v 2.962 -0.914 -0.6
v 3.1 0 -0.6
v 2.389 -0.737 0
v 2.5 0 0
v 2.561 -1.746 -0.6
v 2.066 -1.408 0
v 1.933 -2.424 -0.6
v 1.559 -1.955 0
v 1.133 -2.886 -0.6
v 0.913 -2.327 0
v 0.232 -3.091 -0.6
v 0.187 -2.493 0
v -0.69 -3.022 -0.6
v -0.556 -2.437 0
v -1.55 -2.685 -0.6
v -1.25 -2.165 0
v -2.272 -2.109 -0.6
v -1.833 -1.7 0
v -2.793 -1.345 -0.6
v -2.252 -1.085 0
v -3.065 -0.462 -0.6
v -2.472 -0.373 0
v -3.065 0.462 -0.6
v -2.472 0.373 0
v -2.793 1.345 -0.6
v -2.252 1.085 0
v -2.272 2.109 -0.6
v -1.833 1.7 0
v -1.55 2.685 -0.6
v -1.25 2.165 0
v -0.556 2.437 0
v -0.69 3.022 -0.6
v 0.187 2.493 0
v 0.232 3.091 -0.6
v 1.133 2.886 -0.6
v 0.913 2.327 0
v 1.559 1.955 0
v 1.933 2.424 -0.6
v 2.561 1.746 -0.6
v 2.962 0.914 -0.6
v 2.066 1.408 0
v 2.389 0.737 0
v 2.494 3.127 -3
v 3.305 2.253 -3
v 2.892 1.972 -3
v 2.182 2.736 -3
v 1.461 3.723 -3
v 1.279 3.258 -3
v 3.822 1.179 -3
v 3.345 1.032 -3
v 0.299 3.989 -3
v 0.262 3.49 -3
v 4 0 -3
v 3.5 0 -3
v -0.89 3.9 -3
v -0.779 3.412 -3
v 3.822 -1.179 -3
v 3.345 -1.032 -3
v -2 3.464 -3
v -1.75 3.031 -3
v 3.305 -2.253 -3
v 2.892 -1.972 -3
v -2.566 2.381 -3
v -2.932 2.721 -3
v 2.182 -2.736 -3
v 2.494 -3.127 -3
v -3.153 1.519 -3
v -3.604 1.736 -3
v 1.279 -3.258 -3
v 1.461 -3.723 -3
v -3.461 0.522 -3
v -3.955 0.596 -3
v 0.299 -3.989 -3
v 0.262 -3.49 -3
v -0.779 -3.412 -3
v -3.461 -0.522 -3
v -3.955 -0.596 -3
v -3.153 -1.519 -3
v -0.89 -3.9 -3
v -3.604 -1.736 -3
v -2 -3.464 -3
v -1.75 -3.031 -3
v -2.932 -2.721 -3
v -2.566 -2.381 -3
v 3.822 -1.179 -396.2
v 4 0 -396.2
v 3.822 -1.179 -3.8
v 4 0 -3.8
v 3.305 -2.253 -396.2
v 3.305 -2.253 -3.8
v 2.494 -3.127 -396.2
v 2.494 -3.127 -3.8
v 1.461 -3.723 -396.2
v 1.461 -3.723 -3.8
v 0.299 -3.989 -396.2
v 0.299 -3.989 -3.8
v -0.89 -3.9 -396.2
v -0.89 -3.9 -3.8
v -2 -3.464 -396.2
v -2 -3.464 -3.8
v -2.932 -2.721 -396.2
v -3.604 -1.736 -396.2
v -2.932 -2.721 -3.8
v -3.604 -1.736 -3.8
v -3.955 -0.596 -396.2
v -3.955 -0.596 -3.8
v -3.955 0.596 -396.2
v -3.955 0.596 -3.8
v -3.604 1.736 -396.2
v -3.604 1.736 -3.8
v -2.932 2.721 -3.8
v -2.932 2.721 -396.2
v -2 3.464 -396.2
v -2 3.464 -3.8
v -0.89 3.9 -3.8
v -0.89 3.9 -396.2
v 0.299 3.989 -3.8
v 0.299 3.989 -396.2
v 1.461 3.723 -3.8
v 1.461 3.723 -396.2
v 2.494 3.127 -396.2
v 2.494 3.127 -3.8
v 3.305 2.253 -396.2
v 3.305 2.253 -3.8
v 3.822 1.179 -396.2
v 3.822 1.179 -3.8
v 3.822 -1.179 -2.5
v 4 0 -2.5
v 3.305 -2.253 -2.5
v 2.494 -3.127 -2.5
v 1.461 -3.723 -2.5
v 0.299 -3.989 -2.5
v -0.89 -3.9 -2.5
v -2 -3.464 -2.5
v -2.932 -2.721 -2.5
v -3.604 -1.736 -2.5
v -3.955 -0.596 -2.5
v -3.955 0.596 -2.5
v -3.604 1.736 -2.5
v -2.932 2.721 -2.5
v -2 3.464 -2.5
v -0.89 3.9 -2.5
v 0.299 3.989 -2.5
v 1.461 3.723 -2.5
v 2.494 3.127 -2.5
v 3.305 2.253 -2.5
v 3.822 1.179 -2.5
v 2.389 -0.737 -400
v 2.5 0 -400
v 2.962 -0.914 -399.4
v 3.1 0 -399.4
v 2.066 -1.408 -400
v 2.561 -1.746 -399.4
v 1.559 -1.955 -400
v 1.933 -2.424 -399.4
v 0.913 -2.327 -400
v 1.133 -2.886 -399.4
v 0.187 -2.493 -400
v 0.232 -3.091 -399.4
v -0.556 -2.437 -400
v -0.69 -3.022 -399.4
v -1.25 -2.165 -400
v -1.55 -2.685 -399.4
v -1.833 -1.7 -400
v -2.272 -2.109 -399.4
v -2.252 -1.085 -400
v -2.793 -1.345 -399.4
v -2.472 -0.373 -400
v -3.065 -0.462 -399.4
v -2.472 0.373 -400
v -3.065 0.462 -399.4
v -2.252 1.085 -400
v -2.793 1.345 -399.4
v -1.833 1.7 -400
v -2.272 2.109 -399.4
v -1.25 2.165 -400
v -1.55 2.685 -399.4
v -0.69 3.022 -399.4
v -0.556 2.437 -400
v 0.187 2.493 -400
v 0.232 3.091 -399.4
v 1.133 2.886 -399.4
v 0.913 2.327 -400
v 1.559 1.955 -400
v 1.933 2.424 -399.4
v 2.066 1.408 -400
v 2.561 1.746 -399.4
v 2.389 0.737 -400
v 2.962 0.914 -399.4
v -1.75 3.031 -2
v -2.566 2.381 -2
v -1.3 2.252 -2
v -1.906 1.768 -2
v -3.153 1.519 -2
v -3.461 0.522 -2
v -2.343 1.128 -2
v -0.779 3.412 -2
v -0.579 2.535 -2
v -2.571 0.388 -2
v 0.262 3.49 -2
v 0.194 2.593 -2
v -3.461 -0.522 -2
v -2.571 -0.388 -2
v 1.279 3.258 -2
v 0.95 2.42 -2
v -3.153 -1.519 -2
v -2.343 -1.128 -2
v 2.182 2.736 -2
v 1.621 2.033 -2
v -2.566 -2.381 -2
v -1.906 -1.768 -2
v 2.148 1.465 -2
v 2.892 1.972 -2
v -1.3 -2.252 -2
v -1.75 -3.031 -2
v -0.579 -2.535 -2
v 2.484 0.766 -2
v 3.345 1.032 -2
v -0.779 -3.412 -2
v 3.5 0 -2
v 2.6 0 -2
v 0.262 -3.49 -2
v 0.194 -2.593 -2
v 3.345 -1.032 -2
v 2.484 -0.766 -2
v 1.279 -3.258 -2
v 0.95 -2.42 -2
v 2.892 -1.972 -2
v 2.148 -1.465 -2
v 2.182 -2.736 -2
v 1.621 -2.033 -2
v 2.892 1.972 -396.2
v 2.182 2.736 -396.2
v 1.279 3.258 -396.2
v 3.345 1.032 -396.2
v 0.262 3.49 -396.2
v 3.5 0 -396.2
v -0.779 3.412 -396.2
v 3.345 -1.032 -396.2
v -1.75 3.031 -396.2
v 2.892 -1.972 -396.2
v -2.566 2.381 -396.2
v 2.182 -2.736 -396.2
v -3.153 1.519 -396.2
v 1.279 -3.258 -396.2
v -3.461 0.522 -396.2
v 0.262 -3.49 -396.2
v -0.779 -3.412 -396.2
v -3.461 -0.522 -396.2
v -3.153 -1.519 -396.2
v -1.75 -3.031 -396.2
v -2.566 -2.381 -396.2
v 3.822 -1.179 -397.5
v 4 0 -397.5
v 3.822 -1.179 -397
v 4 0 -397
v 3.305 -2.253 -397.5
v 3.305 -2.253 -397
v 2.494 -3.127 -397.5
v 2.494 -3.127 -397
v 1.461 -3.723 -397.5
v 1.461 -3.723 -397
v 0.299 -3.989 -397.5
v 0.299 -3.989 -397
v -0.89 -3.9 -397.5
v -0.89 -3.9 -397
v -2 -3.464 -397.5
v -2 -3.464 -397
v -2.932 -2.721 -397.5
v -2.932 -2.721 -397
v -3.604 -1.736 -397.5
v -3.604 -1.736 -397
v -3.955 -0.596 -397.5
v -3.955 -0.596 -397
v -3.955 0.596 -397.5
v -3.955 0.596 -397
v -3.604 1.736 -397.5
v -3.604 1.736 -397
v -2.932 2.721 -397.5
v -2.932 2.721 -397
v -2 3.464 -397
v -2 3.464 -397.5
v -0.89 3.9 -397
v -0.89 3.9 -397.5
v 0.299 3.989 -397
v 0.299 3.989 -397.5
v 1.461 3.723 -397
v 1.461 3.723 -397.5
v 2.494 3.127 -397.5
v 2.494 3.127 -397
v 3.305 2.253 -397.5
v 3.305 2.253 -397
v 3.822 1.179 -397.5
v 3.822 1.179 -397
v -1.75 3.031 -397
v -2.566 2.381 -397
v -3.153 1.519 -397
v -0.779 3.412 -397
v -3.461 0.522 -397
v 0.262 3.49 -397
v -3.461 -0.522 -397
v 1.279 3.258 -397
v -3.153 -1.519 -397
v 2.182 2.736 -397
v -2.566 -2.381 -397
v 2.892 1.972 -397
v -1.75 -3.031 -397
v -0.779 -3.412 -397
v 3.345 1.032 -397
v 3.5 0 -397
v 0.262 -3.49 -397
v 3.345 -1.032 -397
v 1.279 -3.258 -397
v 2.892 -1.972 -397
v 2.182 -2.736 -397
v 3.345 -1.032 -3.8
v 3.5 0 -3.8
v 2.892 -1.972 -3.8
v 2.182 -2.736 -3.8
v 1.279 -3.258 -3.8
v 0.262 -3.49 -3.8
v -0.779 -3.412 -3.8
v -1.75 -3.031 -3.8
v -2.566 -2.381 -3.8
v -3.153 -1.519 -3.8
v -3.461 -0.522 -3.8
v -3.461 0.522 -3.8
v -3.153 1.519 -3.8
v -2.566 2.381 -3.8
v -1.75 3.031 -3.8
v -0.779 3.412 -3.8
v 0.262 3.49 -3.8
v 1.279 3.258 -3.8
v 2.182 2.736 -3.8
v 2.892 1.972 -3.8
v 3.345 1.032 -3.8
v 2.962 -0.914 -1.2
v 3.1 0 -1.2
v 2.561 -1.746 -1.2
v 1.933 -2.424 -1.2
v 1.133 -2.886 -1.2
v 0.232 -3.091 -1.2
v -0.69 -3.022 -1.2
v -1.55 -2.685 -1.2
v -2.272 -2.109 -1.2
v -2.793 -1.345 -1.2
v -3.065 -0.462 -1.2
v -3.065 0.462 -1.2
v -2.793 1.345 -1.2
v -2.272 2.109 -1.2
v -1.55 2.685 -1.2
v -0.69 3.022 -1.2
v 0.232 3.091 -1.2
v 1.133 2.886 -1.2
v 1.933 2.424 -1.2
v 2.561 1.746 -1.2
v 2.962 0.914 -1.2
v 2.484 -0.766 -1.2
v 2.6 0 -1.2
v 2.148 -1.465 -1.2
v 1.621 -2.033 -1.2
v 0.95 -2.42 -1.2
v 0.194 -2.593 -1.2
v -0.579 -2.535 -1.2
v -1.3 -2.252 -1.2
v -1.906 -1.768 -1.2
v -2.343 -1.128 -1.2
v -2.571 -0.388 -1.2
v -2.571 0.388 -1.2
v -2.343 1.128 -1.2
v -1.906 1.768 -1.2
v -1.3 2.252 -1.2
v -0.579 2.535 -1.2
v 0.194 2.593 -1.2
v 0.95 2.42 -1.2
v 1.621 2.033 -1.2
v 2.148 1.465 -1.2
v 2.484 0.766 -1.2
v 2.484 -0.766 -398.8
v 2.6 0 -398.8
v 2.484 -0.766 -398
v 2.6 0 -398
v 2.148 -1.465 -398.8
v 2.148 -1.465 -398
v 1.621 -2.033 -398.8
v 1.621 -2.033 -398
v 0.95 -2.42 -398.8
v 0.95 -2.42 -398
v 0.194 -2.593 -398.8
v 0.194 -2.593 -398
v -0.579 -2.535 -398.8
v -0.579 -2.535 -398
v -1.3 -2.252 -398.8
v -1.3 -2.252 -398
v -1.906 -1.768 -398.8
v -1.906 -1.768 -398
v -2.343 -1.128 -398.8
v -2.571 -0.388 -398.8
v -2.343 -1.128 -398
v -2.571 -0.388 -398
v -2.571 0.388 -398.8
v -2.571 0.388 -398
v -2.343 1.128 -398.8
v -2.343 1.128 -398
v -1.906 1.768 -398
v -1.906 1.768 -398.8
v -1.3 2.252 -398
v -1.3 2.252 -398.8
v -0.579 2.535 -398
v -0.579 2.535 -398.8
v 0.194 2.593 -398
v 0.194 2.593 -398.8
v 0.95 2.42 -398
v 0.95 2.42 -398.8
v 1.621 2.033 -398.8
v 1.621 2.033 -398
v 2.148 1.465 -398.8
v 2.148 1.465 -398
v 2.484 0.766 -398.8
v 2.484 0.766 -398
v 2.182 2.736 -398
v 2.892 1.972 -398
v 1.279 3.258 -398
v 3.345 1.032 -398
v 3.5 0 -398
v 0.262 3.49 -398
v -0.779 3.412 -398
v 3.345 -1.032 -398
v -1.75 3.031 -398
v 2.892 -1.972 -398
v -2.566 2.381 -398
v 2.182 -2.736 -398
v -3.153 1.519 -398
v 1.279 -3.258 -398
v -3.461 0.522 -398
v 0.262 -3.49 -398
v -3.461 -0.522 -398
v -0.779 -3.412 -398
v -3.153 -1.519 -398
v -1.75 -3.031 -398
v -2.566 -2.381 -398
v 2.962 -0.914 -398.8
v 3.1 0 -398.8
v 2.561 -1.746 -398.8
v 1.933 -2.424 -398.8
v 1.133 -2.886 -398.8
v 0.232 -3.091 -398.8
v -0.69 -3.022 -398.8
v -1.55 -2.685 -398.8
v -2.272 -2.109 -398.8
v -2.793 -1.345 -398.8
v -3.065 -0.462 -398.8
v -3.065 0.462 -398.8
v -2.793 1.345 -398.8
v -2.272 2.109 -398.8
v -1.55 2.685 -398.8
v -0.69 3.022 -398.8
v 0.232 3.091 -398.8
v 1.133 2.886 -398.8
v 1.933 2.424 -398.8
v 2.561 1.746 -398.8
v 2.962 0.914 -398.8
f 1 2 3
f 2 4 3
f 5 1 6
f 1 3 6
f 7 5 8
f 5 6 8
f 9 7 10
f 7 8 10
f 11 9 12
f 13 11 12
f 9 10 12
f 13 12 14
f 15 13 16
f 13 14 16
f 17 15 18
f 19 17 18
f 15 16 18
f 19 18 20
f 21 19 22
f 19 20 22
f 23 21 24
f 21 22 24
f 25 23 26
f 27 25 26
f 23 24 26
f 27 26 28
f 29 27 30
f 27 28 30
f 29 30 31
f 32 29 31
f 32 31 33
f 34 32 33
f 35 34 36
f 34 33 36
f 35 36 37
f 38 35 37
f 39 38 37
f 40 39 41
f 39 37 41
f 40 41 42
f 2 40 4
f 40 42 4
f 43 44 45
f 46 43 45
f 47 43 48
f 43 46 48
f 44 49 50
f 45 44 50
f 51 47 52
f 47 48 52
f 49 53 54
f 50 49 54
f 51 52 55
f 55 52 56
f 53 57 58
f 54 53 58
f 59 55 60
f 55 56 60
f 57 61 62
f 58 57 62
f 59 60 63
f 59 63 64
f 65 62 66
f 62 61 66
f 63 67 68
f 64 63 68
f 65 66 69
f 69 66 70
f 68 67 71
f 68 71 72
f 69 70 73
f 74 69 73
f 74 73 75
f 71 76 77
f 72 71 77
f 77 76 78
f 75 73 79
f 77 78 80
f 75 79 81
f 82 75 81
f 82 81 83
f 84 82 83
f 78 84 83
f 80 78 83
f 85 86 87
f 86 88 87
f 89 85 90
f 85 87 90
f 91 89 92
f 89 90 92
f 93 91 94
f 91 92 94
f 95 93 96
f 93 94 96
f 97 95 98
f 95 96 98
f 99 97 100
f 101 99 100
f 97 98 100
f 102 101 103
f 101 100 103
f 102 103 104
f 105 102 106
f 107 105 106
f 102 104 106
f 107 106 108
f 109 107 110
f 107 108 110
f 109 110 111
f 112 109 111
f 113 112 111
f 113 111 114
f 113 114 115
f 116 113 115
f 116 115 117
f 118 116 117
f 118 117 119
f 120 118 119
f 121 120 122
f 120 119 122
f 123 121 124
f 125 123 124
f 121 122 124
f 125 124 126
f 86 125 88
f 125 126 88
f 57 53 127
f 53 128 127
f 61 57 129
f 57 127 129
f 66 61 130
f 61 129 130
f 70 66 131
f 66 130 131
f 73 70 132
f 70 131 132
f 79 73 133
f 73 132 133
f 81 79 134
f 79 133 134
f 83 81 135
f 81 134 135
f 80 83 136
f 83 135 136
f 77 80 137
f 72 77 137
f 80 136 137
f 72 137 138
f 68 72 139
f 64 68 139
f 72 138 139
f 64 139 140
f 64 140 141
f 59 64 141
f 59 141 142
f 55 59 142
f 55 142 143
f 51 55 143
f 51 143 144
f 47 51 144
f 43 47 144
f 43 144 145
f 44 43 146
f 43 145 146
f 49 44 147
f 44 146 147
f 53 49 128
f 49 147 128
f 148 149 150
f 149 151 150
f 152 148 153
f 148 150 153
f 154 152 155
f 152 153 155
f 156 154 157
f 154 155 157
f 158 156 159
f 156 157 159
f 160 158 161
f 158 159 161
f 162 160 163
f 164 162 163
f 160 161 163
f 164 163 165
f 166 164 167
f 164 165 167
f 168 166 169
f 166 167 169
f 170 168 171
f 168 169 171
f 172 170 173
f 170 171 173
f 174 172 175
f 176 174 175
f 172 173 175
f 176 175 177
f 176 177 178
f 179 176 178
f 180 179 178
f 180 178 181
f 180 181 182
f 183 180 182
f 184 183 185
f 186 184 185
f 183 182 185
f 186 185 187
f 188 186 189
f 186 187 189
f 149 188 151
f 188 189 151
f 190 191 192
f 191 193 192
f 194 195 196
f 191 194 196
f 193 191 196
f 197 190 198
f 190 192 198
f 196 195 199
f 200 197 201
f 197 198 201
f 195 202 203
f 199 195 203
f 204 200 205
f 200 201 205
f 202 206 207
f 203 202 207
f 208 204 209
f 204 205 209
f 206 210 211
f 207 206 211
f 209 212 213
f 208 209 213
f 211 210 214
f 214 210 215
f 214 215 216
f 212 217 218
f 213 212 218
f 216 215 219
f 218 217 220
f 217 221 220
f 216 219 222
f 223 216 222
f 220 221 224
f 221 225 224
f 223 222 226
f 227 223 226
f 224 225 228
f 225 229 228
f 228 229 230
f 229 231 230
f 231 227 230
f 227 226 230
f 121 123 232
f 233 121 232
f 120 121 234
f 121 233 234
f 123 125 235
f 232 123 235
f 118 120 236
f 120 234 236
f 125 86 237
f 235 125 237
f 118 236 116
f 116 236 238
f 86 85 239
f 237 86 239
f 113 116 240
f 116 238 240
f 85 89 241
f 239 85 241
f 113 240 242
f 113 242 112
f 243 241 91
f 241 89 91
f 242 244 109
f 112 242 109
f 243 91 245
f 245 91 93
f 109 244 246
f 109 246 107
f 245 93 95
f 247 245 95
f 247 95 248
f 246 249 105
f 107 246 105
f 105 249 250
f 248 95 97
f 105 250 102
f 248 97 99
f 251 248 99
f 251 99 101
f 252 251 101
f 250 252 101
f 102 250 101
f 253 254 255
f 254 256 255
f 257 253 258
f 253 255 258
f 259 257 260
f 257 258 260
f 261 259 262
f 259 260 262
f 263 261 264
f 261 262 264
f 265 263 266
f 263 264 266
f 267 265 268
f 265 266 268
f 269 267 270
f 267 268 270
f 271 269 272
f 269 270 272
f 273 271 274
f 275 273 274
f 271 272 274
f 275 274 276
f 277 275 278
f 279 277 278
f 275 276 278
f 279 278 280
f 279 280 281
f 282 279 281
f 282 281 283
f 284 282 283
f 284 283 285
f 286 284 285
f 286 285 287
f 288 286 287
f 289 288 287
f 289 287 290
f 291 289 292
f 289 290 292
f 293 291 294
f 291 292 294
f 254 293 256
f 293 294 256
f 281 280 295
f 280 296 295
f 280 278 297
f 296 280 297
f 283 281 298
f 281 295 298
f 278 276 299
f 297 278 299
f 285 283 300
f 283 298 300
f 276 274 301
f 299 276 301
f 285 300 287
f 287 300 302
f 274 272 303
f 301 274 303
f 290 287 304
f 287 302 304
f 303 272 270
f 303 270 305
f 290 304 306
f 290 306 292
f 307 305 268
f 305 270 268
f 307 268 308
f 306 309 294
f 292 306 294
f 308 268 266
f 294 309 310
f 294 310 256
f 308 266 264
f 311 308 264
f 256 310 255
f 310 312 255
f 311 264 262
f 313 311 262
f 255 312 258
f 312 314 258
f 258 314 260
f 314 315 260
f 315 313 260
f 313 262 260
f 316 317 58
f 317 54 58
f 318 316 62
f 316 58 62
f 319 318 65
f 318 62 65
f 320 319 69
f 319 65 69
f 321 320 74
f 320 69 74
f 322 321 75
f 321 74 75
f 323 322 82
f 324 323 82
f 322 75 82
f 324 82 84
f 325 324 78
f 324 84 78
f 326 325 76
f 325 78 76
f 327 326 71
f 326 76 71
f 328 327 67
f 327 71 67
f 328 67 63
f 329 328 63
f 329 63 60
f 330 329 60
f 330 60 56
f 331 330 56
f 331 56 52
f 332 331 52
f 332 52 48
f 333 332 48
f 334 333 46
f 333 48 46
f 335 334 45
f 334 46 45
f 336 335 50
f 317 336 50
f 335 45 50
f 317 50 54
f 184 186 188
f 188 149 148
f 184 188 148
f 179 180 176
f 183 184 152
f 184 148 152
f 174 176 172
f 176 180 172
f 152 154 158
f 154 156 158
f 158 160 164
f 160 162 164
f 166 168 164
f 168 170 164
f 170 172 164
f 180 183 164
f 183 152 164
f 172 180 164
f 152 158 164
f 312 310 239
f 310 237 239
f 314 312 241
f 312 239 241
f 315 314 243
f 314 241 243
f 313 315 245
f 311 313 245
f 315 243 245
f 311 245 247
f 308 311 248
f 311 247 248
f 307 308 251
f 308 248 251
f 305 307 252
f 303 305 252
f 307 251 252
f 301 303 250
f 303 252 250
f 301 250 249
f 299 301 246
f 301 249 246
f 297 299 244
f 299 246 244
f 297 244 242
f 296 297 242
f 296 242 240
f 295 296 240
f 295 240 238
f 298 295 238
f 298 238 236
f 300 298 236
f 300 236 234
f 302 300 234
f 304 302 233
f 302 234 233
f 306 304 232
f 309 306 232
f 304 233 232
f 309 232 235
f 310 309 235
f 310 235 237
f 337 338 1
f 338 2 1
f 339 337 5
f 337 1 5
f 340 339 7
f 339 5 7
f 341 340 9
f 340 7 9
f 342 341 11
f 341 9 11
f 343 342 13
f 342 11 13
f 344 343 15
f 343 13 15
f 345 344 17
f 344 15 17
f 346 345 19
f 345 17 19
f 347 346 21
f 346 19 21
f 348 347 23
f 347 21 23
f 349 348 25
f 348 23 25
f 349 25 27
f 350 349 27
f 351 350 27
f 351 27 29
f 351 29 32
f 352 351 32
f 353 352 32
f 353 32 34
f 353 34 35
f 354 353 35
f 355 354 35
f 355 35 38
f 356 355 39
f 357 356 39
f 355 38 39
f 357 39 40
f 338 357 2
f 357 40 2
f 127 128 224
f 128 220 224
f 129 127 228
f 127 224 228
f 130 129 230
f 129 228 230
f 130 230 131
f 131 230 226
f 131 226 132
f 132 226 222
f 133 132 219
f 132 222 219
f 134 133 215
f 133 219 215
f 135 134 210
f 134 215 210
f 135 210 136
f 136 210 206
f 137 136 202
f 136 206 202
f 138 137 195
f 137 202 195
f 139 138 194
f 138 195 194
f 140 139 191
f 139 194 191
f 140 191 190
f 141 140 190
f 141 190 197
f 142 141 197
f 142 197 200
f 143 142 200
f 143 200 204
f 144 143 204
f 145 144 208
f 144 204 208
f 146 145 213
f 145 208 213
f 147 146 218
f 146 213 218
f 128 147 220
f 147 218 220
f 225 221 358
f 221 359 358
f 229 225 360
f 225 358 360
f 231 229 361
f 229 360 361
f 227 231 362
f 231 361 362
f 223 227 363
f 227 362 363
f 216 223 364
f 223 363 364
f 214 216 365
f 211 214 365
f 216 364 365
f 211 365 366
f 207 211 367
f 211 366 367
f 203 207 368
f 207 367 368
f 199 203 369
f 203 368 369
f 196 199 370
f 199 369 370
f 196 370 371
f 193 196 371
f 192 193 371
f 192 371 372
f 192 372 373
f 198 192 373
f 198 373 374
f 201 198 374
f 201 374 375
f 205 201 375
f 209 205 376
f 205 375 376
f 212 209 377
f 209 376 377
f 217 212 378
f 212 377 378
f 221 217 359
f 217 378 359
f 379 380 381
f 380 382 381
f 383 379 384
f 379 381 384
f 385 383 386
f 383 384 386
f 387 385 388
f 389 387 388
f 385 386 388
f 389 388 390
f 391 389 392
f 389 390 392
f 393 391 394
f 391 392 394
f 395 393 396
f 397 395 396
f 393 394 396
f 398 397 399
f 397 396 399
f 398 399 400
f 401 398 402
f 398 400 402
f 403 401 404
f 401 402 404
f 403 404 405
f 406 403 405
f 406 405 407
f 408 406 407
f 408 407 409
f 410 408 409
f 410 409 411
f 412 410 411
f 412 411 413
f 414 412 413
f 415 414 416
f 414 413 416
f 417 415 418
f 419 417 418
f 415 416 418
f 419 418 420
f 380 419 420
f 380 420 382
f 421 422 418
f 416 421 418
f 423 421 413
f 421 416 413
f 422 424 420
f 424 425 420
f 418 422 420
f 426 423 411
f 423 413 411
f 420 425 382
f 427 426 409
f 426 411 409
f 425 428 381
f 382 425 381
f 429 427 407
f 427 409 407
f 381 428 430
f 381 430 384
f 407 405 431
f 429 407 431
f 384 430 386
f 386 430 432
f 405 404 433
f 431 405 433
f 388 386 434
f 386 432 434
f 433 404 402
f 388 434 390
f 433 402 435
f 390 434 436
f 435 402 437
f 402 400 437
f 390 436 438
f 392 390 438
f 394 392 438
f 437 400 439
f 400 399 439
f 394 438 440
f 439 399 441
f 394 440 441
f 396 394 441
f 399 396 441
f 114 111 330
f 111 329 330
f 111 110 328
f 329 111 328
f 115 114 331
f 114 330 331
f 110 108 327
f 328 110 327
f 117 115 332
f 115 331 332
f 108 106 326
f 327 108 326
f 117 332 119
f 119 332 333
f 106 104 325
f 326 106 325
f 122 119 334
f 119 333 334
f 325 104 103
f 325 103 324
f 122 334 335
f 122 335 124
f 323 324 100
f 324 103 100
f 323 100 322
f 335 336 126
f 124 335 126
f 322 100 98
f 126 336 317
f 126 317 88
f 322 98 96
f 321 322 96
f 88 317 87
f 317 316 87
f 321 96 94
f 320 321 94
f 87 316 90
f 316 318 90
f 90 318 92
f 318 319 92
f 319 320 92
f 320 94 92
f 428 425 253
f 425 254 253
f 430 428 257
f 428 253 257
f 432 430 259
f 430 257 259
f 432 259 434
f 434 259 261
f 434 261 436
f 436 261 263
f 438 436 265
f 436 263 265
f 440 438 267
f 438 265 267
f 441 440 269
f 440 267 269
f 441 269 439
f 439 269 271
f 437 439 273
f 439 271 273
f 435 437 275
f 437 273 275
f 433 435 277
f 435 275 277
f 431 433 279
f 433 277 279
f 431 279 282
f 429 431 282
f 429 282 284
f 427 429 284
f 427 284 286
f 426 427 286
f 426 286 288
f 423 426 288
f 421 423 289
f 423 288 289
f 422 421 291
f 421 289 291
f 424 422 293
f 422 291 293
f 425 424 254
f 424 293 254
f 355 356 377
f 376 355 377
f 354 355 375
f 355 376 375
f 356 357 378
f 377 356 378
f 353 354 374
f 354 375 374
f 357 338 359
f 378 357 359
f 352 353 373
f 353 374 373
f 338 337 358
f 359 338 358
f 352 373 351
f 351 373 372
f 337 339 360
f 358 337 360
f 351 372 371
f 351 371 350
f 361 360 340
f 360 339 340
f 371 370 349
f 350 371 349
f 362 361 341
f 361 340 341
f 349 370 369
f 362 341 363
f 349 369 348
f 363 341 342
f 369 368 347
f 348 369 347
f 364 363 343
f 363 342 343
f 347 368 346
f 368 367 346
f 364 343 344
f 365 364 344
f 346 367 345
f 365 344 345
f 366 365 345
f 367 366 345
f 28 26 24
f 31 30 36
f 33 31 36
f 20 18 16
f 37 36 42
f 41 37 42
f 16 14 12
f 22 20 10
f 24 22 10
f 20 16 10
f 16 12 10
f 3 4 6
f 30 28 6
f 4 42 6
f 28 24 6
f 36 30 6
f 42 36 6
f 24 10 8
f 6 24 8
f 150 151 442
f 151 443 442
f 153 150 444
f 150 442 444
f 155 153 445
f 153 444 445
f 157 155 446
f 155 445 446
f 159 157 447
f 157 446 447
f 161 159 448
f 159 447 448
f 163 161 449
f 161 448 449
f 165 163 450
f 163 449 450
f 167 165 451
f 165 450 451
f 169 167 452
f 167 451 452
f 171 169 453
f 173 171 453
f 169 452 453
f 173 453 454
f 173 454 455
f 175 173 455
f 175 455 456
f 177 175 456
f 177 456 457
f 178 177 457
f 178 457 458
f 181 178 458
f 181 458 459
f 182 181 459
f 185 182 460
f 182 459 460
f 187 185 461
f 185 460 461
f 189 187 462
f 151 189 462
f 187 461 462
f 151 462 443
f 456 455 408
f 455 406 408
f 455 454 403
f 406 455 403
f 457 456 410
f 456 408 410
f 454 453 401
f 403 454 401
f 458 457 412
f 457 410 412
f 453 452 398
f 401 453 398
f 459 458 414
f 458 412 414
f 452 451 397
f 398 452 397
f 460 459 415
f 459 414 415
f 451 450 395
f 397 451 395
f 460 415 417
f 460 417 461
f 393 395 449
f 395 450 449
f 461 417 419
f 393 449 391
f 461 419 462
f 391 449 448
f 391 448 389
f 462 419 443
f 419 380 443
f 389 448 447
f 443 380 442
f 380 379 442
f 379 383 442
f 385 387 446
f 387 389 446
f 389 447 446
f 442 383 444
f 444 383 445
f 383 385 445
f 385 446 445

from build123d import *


with BuildPart() as part:
    # Esboço2 → Revolução1 (revolve)
    with BuildSketch(Plane(origin=(0, 0, 0), x_dir=(1, 0, 0), z_dir=(0, 1, 0)), mode=Mode.PRIVATE) as revolu_o1_sk:
        Polygon((-2.5, 0), (0, 0), (0, 400), (-2.5, 400), (-3.1, 399.4), (-3.1, 398.8), (-2.6, 398.8), (-2.6, 398), (-3.5, 398), (-4, 397.5), (-4, 397), (-3.5, 397), (-3.5, 396.2), (-4, 396.2), (-4, 3.8), (-3.5, 3.8), (-3.5, 3), (-4, 3), (-4, 2.5), (-3.5, 2), (-2.6, 2), (-2.6, 1.2), (-3.1, 1.2), (-3.1, 0.6), align=None)
    revolve(revolu_o1_sk.sketch.rotate(Axis((0, 0, 0), (0, 0, -1)), 180), axis=Axis((0, 0, 0), (0, 0, -1)))


solid = part.part
